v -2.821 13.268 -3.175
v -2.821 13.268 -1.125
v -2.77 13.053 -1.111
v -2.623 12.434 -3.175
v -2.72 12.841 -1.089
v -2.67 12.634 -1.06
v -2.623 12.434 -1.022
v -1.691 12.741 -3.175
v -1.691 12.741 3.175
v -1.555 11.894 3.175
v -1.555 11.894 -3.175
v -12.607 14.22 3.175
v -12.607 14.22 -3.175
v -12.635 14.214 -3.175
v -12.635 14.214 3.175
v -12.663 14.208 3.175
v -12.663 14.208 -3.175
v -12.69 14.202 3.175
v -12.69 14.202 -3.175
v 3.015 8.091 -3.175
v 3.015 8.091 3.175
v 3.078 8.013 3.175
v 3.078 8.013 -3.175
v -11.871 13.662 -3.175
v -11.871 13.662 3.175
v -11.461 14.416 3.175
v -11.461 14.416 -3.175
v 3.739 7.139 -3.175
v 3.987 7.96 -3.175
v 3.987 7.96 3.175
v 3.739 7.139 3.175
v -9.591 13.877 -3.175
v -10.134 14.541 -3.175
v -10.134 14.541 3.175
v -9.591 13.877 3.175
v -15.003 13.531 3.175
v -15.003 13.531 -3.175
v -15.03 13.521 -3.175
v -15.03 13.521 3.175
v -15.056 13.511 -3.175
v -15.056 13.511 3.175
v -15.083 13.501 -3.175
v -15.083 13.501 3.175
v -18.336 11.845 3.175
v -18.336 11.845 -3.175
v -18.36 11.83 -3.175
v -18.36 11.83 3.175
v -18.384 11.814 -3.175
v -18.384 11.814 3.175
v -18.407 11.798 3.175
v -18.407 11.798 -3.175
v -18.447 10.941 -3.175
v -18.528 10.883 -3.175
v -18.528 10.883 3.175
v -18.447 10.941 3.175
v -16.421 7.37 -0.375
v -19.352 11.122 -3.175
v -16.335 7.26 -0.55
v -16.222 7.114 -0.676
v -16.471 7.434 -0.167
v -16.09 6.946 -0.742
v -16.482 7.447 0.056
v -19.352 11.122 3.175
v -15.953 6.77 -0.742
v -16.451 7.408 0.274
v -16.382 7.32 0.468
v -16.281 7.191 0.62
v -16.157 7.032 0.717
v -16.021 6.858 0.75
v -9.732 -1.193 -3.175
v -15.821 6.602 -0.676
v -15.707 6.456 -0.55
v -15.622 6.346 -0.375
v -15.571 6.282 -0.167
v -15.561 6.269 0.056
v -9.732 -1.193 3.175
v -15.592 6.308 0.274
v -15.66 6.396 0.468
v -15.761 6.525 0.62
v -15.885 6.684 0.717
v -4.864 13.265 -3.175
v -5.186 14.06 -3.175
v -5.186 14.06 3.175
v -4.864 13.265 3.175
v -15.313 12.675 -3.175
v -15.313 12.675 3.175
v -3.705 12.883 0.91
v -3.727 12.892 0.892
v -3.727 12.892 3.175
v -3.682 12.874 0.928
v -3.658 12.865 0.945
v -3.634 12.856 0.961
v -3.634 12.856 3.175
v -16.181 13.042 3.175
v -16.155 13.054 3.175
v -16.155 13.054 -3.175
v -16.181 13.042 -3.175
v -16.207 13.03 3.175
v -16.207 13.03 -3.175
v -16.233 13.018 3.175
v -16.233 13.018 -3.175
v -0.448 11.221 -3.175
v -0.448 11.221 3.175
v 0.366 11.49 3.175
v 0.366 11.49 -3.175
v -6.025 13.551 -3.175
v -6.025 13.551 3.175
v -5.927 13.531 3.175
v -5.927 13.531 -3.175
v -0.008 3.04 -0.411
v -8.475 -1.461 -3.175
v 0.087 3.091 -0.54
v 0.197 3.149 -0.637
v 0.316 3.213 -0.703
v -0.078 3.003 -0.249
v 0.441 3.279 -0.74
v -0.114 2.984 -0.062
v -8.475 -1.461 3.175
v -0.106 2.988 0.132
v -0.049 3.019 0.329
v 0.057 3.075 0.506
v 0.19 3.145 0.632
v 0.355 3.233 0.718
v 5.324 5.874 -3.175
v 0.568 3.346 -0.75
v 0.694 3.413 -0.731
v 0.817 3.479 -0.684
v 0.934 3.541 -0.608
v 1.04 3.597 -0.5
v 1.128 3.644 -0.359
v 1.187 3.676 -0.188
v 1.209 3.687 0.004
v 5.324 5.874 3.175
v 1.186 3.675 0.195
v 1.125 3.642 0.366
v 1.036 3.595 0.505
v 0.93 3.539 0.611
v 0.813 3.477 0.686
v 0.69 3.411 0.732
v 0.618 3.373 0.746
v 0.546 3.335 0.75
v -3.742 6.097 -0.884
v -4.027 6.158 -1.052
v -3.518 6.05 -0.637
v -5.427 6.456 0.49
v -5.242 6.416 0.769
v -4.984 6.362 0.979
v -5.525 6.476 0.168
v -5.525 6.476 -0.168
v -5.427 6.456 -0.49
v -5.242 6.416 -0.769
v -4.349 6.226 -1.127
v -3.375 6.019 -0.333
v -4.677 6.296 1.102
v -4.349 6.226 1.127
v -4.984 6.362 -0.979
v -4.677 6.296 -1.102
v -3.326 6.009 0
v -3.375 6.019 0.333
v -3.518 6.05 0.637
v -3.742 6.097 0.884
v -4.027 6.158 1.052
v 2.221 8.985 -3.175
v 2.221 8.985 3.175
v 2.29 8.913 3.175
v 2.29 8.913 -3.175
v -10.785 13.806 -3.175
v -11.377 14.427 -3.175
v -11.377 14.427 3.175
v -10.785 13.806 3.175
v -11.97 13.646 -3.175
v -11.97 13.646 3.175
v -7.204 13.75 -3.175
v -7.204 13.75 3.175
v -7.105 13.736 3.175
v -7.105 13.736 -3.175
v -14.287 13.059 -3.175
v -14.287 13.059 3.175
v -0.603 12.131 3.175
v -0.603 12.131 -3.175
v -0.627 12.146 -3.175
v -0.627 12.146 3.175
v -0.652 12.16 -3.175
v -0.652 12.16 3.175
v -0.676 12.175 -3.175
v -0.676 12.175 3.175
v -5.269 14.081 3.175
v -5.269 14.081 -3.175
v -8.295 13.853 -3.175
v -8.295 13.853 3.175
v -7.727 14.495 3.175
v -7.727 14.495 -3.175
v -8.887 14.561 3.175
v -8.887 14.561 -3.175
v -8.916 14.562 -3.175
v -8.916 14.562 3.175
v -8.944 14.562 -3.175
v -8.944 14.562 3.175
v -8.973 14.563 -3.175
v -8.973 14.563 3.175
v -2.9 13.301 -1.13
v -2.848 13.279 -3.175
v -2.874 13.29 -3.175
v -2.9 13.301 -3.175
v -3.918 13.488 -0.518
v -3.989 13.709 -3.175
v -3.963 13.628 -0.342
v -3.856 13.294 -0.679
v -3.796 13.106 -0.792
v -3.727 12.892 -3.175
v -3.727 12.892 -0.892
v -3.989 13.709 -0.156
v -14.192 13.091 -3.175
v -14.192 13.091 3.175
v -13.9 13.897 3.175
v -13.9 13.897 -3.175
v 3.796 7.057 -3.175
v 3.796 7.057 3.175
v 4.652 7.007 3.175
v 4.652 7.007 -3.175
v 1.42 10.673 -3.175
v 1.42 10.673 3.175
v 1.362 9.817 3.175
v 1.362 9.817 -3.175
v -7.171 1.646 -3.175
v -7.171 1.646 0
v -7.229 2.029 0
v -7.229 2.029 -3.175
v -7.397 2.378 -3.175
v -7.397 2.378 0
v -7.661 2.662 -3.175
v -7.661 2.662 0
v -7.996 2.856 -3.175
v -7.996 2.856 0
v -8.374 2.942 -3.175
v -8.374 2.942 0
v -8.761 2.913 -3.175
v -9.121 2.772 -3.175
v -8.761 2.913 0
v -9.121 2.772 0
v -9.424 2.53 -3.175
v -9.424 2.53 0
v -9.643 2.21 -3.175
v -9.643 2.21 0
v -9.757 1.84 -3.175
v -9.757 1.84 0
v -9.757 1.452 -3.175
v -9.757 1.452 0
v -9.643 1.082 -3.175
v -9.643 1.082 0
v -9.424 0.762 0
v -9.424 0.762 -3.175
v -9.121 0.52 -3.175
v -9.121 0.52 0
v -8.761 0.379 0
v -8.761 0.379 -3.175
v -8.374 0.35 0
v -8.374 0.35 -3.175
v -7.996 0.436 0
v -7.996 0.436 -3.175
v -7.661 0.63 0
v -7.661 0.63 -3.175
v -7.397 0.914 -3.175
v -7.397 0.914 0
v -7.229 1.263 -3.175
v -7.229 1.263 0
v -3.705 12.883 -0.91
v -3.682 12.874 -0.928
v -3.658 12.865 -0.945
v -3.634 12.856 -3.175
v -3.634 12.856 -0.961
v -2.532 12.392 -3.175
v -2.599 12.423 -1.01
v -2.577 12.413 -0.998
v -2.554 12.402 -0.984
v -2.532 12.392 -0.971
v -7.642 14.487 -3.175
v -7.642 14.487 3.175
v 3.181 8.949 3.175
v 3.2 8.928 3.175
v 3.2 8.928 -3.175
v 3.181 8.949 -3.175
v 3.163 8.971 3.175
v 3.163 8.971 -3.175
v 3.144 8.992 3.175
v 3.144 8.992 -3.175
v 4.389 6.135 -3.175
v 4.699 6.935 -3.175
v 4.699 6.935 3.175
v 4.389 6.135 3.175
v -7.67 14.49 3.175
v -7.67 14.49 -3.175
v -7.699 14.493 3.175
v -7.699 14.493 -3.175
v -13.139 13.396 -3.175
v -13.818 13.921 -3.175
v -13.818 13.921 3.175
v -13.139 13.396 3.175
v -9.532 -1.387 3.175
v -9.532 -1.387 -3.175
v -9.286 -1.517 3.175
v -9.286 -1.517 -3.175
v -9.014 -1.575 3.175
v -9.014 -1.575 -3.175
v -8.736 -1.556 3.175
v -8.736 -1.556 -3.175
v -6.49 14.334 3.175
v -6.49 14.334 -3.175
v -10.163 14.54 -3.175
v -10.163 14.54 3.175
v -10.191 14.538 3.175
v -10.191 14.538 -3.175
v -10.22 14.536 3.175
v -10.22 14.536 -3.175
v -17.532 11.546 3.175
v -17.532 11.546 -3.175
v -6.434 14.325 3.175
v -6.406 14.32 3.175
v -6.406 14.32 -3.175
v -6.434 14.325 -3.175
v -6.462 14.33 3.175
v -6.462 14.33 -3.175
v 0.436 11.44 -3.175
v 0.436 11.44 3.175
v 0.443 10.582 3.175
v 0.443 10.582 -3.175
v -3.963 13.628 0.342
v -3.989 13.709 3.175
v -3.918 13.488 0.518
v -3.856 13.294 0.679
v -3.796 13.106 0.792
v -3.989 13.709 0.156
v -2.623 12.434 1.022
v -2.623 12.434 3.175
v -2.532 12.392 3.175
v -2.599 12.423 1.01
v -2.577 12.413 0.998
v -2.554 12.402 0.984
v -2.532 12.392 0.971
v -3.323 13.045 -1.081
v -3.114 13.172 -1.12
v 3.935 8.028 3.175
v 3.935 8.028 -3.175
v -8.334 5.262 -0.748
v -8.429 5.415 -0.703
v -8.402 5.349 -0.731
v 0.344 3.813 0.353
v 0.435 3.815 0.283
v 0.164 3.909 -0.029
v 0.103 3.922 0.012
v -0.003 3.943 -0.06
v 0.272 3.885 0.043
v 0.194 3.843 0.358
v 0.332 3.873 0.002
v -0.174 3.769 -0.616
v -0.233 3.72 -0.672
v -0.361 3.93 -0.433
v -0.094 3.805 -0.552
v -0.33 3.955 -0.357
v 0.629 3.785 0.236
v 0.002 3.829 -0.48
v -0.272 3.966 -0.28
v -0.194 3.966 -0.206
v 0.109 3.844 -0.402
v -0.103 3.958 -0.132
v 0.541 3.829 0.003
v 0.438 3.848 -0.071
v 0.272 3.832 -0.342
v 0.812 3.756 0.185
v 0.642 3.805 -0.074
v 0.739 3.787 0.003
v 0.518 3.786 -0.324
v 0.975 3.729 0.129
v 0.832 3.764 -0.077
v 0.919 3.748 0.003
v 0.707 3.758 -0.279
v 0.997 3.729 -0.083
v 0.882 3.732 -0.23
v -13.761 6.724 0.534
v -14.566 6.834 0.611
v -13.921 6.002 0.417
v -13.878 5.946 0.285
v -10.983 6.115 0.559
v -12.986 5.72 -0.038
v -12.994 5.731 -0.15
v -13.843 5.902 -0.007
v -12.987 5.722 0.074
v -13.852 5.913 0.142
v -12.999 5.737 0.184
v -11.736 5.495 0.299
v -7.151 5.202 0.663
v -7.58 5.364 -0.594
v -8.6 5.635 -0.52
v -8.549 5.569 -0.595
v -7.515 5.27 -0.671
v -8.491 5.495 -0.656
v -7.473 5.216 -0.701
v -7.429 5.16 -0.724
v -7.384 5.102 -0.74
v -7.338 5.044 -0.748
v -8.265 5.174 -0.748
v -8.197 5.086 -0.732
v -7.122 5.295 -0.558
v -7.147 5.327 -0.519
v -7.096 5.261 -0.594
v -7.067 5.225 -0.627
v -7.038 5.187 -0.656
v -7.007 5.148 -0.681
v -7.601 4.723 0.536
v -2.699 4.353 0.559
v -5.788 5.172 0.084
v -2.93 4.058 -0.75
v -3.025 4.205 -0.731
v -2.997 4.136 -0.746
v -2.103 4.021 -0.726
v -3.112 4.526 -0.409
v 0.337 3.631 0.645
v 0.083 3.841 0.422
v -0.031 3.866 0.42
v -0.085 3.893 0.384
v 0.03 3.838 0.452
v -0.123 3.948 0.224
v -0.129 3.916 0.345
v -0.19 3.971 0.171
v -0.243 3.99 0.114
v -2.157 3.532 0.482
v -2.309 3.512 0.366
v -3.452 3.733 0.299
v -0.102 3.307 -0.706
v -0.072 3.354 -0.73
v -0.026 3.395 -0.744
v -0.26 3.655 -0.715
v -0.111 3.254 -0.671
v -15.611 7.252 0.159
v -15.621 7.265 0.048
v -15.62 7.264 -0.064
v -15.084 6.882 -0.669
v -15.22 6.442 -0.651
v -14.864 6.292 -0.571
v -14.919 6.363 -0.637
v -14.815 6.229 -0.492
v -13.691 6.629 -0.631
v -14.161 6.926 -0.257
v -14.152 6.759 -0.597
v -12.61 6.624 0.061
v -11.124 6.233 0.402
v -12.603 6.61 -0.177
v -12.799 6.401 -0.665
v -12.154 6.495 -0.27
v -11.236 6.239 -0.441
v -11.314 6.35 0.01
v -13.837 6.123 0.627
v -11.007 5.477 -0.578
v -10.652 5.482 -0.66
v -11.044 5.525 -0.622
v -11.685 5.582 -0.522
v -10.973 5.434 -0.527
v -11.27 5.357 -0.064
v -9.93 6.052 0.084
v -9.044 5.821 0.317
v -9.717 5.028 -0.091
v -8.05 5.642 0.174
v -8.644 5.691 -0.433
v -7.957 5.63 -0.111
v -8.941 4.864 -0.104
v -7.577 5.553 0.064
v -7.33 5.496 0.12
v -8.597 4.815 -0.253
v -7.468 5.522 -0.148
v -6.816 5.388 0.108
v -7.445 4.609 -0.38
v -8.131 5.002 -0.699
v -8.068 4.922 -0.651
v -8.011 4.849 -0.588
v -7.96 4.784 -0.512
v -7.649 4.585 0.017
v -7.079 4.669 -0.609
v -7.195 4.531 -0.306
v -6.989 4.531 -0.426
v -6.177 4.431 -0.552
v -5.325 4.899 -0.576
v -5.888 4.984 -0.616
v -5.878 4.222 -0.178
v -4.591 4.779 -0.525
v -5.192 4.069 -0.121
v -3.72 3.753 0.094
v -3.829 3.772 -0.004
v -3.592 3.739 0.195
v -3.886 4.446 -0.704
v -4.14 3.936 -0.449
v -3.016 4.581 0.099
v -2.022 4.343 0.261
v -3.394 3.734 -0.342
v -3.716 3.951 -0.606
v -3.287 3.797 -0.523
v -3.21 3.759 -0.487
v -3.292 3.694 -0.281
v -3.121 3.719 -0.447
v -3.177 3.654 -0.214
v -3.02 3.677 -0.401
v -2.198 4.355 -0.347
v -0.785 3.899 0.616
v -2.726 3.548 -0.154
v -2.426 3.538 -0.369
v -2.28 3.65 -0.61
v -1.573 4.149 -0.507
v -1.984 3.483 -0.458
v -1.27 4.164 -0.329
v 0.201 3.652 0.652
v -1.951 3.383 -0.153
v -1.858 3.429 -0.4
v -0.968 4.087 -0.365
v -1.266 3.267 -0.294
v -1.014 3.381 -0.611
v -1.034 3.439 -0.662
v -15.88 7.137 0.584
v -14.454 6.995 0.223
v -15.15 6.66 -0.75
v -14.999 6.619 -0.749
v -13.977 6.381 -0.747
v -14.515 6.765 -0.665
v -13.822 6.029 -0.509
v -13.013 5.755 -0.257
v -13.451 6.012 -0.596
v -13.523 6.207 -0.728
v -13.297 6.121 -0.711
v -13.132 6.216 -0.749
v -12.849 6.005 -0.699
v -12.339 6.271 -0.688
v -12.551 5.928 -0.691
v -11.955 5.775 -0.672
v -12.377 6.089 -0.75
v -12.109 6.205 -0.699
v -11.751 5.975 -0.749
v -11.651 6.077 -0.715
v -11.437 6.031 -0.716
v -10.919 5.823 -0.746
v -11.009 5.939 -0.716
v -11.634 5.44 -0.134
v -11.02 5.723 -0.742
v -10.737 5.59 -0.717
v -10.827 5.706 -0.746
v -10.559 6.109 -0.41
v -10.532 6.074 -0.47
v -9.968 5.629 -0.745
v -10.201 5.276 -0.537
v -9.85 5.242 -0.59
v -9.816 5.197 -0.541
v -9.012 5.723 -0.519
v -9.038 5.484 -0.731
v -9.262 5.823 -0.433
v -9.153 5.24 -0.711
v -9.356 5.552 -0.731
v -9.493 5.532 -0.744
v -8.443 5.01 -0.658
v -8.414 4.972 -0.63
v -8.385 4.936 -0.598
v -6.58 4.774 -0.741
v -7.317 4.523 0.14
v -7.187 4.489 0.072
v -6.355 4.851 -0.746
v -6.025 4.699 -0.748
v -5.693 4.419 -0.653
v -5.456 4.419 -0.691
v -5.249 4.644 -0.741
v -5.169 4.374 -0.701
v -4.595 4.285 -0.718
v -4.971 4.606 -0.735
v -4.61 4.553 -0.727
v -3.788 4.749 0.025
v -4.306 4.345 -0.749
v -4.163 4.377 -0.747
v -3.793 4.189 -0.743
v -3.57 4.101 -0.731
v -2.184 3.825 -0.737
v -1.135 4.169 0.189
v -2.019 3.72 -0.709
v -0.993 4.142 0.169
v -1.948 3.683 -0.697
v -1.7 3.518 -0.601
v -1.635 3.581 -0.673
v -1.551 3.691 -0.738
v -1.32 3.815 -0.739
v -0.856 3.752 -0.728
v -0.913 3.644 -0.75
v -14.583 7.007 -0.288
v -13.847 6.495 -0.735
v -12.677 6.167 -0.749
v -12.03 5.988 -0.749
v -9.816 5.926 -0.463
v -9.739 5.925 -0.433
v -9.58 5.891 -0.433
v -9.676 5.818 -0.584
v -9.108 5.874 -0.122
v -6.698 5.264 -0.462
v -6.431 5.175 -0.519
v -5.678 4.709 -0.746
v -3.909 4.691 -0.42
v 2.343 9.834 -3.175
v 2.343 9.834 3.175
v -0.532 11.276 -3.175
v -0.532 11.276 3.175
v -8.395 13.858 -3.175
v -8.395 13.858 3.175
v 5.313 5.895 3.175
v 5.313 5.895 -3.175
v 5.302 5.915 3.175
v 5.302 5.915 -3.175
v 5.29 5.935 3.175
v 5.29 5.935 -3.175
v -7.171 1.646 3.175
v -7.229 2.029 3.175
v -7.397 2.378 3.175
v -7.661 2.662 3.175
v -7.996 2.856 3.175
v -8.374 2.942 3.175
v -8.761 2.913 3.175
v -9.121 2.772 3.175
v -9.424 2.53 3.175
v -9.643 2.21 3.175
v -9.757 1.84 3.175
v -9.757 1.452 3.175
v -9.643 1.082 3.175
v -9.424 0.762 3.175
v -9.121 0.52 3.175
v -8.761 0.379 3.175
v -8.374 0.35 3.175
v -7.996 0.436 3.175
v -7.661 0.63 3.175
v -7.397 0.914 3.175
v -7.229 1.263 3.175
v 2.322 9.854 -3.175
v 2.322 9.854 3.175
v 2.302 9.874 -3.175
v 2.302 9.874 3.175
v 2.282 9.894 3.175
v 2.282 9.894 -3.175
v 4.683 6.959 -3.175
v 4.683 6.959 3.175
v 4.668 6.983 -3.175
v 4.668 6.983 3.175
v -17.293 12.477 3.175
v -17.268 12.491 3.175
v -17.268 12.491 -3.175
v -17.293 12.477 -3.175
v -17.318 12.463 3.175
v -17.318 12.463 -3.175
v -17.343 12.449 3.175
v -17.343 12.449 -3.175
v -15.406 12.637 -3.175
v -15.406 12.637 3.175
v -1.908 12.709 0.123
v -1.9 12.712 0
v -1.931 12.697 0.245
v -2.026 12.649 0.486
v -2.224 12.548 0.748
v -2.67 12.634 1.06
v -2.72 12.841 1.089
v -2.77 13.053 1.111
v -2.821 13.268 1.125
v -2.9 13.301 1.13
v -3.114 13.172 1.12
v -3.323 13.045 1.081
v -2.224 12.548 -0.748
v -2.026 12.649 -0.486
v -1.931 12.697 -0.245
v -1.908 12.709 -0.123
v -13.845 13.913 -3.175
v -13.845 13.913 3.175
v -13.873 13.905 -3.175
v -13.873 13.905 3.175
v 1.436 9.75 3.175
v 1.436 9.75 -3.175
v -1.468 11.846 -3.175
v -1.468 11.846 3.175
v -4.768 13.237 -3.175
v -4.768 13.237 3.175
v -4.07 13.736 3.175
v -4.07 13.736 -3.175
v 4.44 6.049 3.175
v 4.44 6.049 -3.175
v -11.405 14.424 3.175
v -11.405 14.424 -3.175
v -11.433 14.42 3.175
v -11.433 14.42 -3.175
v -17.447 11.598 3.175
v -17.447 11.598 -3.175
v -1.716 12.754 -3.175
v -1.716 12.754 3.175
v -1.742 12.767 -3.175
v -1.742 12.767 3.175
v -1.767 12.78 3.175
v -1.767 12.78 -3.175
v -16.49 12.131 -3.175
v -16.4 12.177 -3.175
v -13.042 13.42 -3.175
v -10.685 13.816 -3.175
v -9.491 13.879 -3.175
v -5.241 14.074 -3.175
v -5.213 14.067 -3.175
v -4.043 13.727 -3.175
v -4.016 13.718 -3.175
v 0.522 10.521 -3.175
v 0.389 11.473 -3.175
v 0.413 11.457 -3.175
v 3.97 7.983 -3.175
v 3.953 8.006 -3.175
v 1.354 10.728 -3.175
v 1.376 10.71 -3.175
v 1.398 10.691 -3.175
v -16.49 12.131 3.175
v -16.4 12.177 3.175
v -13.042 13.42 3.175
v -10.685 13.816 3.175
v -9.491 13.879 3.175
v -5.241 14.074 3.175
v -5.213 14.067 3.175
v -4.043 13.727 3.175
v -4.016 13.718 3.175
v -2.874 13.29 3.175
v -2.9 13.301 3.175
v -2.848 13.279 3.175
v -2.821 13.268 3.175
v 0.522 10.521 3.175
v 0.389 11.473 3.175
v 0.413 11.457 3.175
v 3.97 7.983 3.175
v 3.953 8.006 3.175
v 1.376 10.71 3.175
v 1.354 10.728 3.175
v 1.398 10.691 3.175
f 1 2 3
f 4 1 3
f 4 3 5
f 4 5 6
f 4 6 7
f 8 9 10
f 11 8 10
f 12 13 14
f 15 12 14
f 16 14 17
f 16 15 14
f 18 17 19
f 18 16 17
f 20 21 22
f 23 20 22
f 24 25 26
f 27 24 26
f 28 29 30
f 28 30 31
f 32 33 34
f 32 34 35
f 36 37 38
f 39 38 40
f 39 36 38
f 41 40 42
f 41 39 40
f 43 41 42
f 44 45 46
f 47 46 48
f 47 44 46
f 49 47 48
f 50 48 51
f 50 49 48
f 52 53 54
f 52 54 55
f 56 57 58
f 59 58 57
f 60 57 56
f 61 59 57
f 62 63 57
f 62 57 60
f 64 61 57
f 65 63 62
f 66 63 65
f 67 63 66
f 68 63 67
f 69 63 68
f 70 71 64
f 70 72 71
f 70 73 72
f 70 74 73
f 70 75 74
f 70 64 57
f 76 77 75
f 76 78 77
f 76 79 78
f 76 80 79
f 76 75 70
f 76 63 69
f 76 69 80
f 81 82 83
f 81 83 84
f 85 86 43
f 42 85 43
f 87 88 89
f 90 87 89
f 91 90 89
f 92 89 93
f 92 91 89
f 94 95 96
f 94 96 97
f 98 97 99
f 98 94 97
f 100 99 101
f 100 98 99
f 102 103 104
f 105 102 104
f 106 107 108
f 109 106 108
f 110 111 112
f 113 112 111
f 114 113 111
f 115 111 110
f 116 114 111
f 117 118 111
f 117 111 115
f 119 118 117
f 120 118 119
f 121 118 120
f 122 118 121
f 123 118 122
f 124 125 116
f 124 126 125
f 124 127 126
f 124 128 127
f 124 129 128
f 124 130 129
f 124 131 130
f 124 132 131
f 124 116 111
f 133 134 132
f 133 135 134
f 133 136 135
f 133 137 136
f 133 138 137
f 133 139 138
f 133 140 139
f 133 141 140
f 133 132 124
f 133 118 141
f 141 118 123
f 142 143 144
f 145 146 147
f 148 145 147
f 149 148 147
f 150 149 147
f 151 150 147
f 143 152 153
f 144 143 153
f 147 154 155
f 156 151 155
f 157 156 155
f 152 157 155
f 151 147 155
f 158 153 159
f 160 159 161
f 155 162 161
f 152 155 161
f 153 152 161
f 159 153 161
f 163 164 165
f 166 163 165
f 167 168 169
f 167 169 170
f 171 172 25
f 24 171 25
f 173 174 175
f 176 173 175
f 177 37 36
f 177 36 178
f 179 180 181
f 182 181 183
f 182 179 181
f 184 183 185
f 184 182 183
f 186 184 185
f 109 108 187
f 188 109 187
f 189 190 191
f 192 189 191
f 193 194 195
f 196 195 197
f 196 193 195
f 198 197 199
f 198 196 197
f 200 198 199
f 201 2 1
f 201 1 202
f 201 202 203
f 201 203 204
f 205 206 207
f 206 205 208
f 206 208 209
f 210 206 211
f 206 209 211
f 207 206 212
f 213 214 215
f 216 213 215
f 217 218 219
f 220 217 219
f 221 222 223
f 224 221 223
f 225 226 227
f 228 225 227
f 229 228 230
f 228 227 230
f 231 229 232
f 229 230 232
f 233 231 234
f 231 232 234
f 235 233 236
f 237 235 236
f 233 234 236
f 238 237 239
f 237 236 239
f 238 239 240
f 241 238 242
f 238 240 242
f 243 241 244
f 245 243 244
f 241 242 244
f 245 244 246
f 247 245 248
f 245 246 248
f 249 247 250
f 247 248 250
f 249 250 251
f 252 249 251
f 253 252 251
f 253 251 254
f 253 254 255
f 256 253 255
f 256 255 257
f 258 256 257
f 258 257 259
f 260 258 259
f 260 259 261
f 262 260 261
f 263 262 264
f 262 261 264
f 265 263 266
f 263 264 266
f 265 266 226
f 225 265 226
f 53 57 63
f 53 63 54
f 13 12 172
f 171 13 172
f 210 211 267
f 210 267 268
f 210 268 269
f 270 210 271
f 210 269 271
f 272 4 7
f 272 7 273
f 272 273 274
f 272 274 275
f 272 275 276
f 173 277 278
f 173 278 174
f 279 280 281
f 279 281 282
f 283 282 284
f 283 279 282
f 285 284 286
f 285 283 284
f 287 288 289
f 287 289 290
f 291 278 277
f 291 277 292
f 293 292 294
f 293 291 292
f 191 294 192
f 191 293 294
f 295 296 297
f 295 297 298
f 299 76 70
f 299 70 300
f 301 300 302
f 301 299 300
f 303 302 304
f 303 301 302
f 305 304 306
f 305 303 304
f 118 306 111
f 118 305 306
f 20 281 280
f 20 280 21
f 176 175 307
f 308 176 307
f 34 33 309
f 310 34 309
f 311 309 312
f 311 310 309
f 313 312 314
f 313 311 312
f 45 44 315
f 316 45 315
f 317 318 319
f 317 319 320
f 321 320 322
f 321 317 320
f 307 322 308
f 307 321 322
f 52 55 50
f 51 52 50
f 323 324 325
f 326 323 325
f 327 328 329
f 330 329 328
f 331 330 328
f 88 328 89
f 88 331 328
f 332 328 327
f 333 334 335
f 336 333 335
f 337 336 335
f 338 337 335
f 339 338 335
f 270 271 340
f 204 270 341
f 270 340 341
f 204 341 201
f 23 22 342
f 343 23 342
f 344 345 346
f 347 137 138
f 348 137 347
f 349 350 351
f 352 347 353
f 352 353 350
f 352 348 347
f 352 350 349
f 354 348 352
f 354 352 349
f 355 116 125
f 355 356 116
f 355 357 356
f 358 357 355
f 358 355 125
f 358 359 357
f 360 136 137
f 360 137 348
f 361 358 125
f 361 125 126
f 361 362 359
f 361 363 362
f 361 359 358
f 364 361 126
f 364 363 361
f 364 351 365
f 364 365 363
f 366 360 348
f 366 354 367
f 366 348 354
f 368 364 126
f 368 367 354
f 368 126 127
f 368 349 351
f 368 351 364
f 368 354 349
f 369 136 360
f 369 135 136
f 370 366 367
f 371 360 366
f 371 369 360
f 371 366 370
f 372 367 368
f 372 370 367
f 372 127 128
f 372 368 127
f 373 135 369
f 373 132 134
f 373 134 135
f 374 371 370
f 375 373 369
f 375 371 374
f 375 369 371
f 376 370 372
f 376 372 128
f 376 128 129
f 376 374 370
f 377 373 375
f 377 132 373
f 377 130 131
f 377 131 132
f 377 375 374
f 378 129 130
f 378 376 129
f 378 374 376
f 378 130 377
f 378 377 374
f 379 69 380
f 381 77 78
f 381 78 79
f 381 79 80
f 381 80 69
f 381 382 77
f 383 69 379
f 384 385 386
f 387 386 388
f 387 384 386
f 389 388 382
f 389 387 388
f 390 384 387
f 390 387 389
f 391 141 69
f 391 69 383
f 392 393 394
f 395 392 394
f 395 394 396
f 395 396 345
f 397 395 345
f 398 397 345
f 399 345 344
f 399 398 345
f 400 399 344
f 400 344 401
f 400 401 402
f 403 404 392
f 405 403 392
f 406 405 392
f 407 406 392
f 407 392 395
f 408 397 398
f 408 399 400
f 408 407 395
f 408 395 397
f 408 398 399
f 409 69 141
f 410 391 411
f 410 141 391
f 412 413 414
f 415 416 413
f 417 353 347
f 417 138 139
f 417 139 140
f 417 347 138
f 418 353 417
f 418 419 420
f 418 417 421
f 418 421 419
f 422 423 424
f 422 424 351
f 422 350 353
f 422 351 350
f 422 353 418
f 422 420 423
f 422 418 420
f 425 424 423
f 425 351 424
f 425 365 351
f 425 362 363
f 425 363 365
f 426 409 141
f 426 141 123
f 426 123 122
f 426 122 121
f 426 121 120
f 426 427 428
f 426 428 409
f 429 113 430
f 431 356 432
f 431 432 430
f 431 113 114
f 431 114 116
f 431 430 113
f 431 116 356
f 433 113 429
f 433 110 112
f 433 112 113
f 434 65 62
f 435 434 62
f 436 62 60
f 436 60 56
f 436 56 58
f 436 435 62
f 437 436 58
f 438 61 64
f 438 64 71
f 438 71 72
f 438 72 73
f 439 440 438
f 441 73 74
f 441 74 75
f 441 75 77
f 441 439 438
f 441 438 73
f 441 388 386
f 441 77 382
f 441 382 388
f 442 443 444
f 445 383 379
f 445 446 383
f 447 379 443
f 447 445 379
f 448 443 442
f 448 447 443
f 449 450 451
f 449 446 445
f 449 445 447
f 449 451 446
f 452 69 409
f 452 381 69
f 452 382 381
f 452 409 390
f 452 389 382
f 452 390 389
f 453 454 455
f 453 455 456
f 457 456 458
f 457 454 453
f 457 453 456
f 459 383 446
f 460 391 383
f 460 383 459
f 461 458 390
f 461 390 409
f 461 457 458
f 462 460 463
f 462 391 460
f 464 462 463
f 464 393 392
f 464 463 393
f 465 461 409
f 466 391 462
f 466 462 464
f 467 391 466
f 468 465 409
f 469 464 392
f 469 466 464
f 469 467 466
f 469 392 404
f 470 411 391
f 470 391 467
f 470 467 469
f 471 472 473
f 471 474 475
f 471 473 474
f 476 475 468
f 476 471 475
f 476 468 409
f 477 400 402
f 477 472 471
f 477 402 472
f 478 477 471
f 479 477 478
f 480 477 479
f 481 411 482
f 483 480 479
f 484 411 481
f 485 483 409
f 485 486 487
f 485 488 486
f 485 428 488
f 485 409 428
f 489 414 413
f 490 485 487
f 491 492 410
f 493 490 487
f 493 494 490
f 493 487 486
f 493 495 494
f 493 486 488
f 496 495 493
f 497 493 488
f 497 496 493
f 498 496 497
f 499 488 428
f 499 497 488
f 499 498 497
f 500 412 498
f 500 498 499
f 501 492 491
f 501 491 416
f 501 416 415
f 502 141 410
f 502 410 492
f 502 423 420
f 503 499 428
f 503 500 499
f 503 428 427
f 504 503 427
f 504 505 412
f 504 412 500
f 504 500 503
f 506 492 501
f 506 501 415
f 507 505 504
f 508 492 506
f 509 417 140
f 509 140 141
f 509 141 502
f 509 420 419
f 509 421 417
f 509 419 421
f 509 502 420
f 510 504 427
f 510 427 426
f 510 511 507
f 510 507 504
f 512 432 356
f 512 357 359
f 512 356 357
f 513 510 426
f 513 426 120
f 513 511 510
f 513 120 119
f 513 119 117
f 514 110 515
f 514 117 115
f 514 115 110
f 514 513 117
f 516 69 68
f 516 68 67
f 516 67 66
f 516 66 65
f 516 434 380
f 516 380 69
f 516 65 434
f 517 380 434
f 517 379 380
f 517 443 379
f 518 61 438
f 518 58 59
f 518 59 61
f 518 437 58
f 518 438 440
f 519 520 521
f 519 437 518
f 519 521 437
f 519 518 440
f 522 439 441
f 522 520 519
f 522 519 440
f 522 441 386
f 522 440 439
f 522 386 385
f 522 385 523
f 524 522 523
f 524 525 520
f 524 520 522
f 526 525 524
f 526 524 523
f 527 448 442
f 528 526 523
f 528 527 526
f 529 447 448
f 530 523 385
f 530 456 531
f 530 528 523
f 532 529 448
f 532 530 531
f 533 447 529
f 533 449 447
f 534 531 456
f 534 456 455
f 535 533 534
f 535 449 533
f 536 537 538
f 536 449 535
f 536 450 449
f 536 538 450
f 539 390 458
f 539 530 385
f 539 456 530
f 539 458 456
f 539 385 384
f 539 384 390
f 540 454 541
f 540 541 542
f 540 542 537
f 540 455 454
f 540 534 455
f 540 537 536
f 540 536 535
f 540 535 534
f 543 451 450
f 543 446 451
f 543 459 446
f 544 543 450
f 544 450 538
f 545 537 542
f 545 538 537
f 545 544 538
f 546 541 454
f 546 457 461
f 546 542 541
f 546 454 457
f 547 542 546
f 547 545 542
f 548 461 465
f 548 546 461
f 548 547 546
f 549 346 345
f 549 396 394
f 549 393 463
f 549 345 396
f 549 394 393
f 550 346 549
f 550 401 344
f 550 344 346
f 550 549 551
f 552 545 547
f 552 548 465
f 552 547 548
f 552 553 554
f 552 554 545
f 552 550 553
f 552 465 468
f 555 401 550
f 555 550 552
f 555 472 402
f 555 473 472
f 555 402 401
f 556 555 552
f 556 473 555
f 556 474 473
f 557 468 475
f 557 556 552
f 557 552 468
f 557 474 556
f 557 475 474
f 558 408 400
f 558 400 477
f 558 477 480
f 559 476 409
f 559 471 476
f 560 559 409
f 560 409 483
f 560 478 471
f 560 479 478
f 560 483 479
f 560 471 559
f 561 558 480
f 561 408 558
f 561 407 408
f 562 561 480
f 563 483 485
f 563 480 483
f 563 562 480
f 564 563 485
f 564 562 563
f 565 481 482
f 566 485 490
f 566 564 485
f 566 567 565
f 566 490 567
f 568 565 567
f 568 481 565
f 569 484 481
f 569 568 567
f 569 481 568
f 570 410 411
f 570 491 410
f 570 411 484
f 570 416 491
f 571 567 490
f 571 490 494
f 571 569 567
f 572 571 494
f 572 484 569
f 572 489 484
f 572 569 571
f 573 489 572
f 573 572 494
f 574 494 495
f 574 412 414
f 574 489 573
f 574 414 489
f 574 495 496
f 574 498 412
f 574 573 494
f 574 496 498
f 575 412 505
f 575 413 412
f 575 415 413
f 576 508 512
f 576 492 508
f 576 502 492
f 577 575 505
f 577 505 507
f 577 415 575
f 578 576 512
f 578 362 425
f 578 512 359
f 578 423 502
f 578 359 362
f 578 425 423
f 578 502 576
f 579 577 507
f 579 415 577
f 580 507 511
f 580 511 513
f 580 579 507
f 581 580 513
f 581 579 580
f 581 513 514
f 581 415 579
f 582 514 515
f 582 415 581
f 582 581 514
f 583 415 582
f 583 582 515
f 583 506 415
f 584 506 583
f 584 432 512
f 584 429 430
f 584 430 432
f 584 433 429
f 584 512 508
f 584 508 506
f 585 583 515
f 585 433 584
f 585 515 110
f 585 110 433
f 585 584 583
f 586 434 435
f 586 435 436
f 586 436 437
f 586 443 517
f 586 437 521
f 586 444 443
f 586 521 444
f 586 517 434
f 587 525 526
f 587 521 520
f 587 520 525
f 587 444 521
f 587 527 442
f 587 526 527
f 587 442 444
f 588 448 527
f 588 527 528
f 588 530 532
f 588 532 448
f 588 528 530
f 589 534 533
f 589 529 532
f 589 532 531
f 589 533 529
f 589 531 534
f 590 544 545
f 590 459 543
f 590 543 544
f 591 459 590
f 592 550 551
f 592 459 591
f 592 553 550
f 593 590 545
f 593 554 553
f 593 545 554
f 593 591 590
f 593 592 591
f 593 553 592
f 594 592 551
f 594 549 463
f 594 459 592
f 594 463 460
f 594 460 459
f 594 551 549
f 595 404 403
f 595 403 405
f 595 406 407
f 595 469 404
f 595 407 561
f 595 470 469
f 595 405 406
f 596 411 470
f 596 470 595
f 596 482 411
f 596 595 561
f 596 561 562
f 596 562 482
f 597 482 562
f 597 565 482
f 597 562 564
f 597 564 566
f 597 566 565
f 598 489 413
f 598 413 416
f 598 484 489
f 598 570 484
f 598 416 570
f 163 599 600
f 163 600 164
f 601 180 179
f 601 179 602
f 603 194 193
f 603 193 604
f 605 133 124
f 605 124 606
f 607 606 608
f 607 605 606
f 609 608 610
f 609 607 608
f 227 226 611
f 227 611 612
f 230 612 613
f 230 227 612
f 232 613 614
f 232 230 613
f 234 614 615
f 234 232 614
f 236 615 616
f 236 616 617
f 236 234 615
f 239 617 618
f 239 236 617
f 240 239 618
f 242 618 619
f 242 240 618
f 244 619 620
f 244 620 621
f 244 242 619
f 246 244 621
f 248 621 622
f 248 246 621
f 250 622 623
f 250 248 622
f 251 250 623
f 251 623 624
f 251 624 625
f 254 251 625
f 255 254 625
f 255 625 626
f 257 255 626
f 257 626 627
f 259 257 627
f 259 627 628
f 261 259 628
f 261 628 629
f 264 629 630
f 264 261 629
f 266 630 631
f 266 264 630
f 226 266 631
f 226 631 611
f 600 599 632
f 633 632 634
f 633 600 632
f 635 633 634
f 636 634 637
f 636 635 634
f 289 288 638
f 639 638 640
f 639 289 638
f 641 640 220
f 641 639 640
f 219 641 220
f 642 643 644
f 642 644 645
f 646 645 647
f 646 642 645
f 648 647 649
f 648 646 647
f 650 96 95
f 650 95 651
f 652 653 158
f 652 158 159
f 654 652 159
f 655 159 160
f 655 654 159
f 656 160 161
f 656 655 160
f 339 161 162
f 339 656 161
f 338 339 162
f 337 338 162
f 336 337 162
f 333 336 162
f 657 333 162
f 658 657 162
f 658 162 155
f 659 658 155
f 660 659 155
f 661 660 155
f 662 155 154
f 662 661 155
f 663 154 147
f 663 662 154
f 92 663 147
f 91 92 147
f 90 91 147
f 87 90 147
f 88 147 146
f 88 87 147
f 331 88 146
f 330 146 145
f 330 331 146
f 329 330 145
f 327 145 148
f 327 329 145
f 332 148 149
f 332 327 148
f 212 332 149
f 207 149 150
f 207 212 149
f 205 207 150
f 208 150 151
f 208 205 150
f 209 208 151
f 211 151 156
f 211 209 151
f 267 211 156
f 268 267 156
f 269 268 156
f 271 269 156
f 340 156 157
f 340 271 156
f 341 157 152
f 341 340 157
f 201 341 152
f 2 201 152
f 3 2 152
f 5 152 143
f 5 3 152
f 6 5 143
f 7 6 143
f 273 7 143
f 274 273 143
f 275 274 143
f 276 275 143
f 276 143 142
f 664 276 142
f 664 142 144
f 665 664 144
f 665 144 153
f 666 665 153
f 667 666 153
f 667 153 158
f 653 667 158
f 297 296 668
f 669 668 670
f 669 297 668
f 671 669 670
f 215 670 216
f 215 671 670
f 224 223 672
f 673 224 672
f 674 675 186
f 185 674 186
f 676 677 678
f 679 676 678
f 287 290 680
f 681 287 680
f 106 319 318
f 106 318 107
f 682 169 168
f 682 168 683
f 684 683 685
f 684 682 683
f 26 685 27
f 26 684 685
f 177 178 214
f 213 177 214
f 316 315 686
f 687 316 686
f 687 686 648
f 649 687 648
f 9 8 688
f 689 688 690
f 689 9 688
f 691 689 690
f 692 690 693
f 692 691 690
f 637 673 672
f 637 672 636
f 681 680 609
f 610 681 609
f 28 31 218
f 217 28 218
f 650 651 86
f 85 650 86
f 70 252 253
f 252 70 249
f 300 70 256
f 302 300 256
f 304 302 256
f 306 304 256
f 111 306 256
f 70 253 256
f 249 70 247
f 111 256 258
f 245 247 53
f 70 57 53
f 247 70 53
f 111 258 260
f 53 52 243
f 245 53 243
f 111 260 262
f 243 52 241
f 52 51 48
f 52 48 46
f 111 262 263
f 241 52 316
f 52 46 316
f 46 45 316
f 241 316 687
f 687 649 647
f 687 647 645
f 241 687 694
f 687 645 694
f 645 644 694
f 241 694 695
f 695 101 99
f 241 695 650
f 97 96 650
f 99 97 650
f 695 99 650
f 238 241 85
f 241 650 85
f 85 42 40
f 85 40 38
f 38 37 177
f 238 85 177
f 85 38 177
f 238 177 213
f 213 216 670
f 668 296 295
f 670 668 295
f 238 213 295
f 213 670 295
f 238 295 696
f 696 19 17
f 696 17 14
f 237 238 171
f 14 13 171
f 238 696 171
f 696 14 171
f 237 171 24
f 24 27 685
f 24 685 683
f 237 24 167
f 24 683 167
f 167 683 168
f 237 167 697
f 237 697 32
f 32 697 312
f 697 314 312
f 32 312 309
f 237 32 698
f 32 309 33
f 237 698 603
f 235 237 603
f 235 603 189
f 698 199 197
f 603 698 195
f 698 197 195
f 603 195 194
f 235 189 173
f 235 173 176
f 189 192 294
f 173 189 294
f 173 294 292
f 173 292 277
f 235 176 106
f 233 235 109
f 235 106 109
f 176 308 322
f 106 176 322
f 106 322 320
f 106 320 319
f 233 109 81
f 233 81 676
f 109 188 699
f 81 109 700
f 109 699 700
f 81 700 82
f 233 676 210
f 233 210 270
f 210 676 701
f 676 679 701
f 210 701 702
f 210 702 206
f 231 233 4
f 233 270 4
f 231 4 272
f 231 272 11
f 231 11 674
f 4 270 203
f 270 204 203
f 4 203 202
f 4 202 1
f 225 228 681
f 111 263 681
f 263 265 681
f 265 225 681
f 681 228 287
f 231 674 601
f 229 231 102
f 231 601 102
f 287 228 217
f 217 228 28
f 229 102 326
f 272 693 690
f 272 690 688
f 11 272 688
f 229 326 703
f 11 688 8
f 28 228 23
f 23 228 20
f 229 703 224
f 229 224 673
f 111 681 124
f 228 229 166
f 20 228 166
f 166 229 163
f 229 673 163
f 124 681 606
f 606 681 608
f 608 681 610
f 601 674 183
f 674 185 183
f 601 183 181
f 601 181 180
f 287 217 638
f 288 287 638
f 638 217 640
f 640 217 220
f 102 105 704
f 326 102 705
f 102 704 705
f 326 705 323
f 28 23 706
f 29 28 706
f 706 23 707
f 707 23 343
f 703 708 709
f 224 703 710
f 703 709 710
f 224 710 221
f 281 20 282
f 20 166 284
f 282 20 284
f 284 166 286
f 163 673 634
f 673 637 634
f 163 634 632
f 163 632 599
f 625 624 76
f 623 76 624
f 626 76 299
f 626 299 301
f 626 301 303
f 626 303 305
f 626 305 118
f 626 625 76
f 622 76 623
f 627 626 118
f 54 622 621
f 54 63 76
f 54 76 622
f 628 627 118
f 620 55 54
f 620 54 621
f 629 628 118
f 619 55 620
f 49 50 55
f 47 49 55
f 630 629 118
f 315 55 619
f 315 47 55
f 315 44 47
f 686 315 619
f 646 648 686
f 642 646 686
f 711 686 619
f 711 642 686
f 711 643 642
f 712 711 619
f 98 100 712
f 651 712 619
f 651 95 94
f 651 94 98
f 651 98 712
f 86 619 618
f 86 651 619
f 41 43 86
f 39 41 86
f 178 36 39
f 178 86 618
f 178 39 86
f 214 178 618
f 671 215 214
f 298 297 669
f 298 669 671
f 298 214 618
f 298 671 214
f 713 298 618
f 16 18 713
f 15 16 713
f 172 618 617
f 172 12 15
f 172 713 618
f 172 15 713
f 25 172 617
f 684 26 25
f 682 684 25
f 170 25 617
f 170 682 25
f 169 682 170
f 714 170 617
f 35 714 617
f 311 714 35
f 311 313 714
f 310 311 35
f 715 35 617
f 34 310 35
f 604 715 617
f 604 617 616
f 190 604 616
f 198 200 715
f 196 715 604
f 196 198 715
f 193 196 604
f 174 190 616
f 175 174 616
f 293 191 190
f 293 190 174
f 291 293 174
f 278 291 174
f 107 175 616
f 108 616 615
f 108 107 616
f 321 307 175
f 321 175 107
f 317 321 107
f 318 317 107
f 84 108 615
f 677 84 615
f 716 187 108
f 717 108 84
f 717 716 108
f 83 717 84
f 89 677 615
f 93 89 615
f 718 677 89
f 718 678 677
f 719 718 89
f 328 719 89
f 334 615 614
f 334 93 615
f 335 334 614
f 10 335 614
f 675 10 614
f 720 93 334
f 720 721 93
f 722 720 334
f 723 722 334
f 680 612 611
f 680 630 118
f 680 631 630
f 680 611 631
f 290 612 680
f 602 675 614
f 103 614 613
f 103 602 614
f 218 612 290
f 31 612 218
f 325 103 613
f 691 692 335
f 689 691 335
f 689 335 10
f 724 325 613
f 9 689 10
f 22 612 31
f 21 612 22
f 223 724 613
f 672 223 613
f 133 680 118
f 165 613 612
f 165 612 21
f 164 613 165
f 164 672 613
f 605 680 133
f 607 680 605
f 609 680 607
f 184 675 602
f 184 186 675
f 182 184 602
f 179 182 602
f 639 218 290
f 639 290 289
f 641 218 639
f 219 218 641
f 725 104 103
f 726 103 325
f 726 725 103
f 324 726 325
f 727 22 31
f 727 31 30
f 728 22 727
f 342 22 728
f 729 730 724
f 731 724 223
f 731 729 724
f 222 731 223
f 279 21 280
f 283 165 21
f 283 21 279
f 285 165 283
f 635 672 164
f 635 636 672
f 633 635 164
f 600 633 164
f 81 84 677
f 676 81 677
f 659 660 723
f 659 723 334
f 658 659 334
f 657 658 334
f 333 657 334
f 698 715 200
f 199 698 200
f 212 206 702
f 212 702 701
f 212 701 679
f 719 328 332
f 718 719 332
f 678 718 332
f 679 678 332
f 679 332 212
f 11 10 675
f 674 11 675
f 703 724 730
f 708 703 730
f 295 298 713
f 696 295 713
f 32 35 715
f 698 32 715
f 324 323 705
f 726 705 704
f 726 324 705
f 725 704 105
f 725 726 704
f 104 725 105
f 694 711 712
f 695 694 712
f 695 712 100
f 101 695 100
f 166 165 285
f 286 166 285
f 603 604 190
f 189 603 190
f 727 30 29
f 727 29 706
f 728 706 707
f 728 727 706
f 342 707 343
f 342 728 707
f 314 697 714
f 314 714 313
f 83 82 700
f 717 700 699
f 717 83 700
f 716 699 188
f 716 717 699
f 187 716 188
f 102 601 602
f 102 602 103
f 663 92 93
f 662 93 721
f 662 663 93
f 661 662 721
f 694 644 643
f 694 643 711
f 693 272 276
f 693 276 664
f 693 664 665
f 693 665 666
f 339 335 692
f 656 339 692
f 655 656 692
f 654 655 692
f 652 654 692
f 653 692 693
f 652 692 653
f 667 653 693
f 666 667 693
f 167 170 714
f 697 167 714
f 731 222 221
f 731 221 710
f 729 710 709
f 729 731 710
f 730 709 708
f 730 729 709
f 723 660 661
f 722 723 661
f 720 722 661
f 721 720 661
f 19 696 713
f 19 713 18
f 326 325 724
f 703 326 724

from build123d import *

# Parameters (mm, degrees)
BOSS_EXTRUDE1_DEPTH      = 3.175
BOSS_EXTRUDE1_DEPTH_BACK = 3.175
SKETCH1_R                = 1.3
SKETCH4_R                = 0.75
CUT_EXTRUDE2_DEPTH       = 7.5
CUT_EXTRUDE2_DEPTH_BACK  = 10
SKETCH3_R                = 1.1303
CUT_EXTRUDE3_DEPTH       = 10
CUT_EXTRUDE3_DEPTH_BACK  = 10


with BuildPart() as part:
    # Sketch1 → Boss-Extrude1 (new, two sides: drawn at the far end of the back side and taken through both)
    with BuildSketch(Plane.XY.offset(-BOSS_EXTRUDE1_DEPTH_BACK)):
        with BuildLine():
            Line((-19.351944596, 11.121666082), (-9.732209918, -1.193299023))
            ThreePointArc((-9.732209918, -1.193299023), (-9.152143222, -1.55583694), (-8.474751471, -1.460697412))
            Line((-8.474751471, -1.460697412), (5.323571039, 5.874420633))
            ThreePointArc((5.323571039, 5.874420633), (-5.801036197, 14.202963476), (-19.351944596, 11.121666082))
        make_face()
        with Locations((-8.471265065, 1.646037216)):
            Circle(SKETCH1_R, mode=Mode.SUBTRACT)
    extrude(amount=BOSS_EXTRUDE1_DEPTH + BOSS_EXTRUDE1_DEPTH_BACK)

    # Cut-Sweep1: sweep along a path in Sketch2
    with BuildLine(Plane.XY) as cut_sweep1_path:
        Line((-16.021378593, 6.857951387), (3.426511905, 2.722359798))
    # Sketch4 → Cut-Sweep1 (sweep, cut)
    with BuildSketch(Plane(origin=(-6.623066075, -5.173554115, 0), x_dir=(0, 0, 1), z_dir=(-0.7880657186592105, -0.6155911167927476, 0))):
        with Locations((0, 15.267134729)):
            Circle(SKETCH4_R)
    sweep(path=cut_sweep1_path.line, mode=Mode.SUBTRACT)

    # Sketch3 → Cut-Extrude2 (cut, two sides: drawn at the far end of the back side and taken through both)
    with BuildSketch(Plane(origin=(2.63861758, 12.40827211, 0), x_dir=(0.9781290338253494, -0.2079990220839719, 0), z_dir=(-0.2079990220839719, -0.9781290338253494, 0)).offset(-CUT_EXTRUDE2_DEPTH_BACK)):
        with Locations((-5.633213298, 0)):
            Circle(SKETCH3_R)
    extrude(amount=CUT_EXTRUDE2_DEPTH + CUT_EXTRUDE2_DEPTH_BACK, mode=Mode.SUBTRACT)

    # Sketch5 → Cut-Extrude3 (cut, two sides: drawn at the far end of the back side and taken through both)
    with BuildSketch(Plane.XY.offset(-CUT_EXTRUDE3_DEPTH_BACK)):
        with BuildLine():
            Line((-18.335959881, 11.845477975), (-17.532299102, 11.545639171))
            Line((-17.532299102, 11.545639171), (-17.446850408, 11.59758646))
            Line((-17.446850408, 11.59758646), (-17.343115269, 12.449063399))
            ThreePointArc((-17.343115269, 12.449063399), (-17.844834345, 12.155983405), (-18.335959881, 11.845477975))
        make_face()
        with BuildLine():
            Line((-19.351944596, 11.121666082), (-18.527988766, 10.883190202))
            Line((-18.527988766, 10.883190202), (-18.446694016, 10.941423901))
            Line((-18.446694016, 10.941423901), (-18.407365445, 11.798294498))
            ThreePointArc((-18.407365445, 11.798294498), (-18.88559278, 11.468269454), (-19.351944596, 11.121666082))
        make_face()
        with BuildLine():
            Line((-17.268359717, 12.490736443), (-16.489556709, 12.131237025))
            Line((-16.489556709, 12.131237025), (-16.400439201, 12.176602977))
            Line((-16.400439201, 12.176602977), (-16.23288644, 13.017852066))
            ThreePointArc((-16.23288644, 13.017852066), (-16.755248788, 12.763381061), (-17.268359717, 12.490736443))
        make_face()
        with BuildLine():
            Line((-16.15520532, 13.053778081), (-15.405681675, 12.636659079))
            Line((-15.405681675, 12.636659079), (-15.313401308, 12.675186133))
            Line((-15.313401308, 12.675186133), (-15.082982195, 13.501431247))
            ThreePointArc((-15.082982195, 13.501431247), (-15.623022142, 13.287013969), (-16.15520532, 13.053778081))
        make_face()
        with BuildLine():
            Line((-15.002816533, 13.531406266), (-14.286827611, 13.059035839))
            Line((-14.286827611, 13.059035839), (-14.191908301, 13.090505261))
            Line((-14.191908301, 13.090505261), (-13.89993102, 13.89705546))
            ThreePointArc((-13.89993102, 13.89705546), (-14.454582535, 13.723909246), (-15.002816533, 13.531406266))
        make_face()
        with BuildLine():
            Line((-13.817735952, 13.920909302), (-13.139346723, 13.395969296))
            Line((-13.139346723, 13.395969296), (-13.042327365, 13.42020242))
            Line((-13.042327365, 13.42020242), (-12.690449596, 14.202478581))
            ThreePointArc((-12.690449596, 14.202478581), (-13.256563688, 14.071586455), (-13.817735952, 13.920909302))
        make_face()
        with BuildLine():
            Line((-12.606691776, 14.220075817), (-11.96975374, 13.645546536))
            Line((-11.96975374, 13.645546536), (-11.871185156, 13.662405782))
            Line((-11.871185156, 13.662405782), (-11.461404655, 14.415966594))
            ThreePointArc((-11.461404655, 14.415966594), (-12.035767257, 14.328071685), (-12.606691776, 14.220075817))
        make_face()
        with BuildLine():
            Line((-11.376559612, 14.427207318), (-10.784688934, 13.806350606))
            Line((-10.784688934, 13.806350606), (-10.685130738, 13.815740255))
            Line((-10.685130738, 13.815740255), (-10.219774001, 14.536307437))
            ThreePointArc((-10.219774001, 14.536307437), (-10.799124216, 14.491908762), (-11.376559612, 14.427207318))
        make_face()
        with BuildLine():
            Line((-10.134323437, 14.541127831), (-9.590880415, 13.877468553))
            Line((-9.590880415, 13.877468553), (-9.49089784, 13.879335297))
            Line((-9.49089784, 13.879335297), (-8.972606893, 14.562817887))
            ThreePointArc((-8.972606893, 14.562817887), (-9.553655506, 14.562167515), (-10.134323437, 14.541127831))
        make_face()
        with BuildLine():
            Line((-8.887035946, 14.561190583), (-8.395105934, 13.85849661))
            Line((-8.395105934, 13.85849661), (-8.295266624, 13.852829851))
            Line((-8.295266624, 13.852829851), (-7.726984022, 14.49534743))
            ThreePointArc((-7.726984022, 14.49534743), (-8.306432177, 14.538449054), (-8.887035946, 14.561190583))
        make_face()
        with BuildLine():
            Line((-7.641778514, 14.487281668), (-7.204154406, 13.749542489))
            Line((-7.204154406, 13.749542489), (-7.10502519, 13.736374399))
            Line((-7.10502519, 13.736374399), (-6.489977312, 14.334279127))
            ThreePointArc((-6.489977312, 14.334279127), (-7.064535238, 14.420888041), (-7.641778514, 14.487281668))
        make_face()
        with BuildLine():
            Line((-6.405620991, 14.319820698), (-6.024787362, 13.551224769))
            Line((-6.024787362, 13.551224769), (-5.926931038, 13.530630109))
            Line((-5.926931038, 13.530630109), (-5.268609769, 14.080527429))
            ThreePointArc((-5.268609769, 14.080527429), (-5.835015459, 14.210151917), (-6.405620991, 14.319820698))
        make_face()
        with BuildLine():
            Line((-5.185581561, 14.05975842), (-4.863700563, 13.264669382))
            Line((-4.863700563, 13.264669382), (-4.767672704, 13.236765076))
            Line((-4.767672704, 13.236765076), (-4.06981561, 13.73553299))
            ThreePointArc((-4.06981561, 13.73553299), (-4.624853342, 13.907437121), (-5.185581561, 14.05975842))
        make_face()
        with BuildLine():
            Line((-3.9885869, 13.708571317), (-3.727485988, 12.891503223))
            Line((-3.727485988, 12.891503223), (-3.633831783, 12.856447697))
            Line((-3.633831783, 12.856447697), (-2.900400891, 13.30125449))
            ThreePointArc((-2.900400891, 13.30125449), (-3.440919483, 13.514462291), (-3.9885869, 13.708571317))
        make_face()
        with BuildLine():
            Line((-2.82143285, 13.268253224), (-2.622594402, 12.433844914))
            Line((-2.622594402, 12.433844914), (-2.531845566, 12.391837192))
            Line((-2.531845566, 12.391837192), (-1.767004872, 12.78015751))
            ThreePointArc((-1.767004872, 12.78015751), (-2.289935572, 13.033458511), (-2.82143285, 13.268253224))
        make_face()
        with BuildLine():
            Line((-1.690745835, 12.741304013), (-1.55529874, 11.894292773))
            Line((-1.55529874, 11.894292773), (-1.467970492, 11.84557135))
            Line((-1.467970492, 11.84557135), (-0.676062318, 12.175200535))
            ThreePointArc((-0.676062318, 12.175200535), (-1.178436229, 12.46715664), (-1.690745835, 12.741304013))
        make_face()
        with BuildLine():
            Line((-0.602945237, 12.130715396), (-0.531658487, 11.275910064))
            Line((-0.531658487, 11.275910064), (-0.448246626, 11.220751552))
            Line((-0.448246626, 11.220751552), (0.366233034, 11.489818161))
            ThreePointArc((0.366233034, 11.489818161), (-0.112731901, 11.818771812), (-0.602945237, 12.130715396))
        make_face()
        with BuildLine():
            Line((0.43579304, 11.439953939), (0.442514722, 10.582207604))
            Line((0.442514722, 10.582207604), (0.521536632, 10.520925162))
            Line((0.521536632, 10.520925162), (1.353963634, 10.72790159))
            ThreePointArc((1.353963634, 10.72790159), (0.90112696, 11.091985181), (0.43579304, 11.439953939))
        make_face()
        with BuildLine():
            Line((1.419571645, 10.672941387), (1.361690097, 9.817123835))
            Line((1.361690097, 9.817123835), (1.435873415, 9.750065388))
            Line((1.435873415, 9.750065388), (2.281521722, 9.893776544))
            ThreePointArc((2.281521722, 9.893776544), (1.857384253, 10.290923018), (1.419571645, 10.672941387))
        make_face()
        with BuildLine():
            Line((2.342805254, 9.834032391), (2.220649092, 8.985002457))
            Line((2.220649092, 8.985002457), (2.289572649, 8.912548725))
            Line((2.289572649, 8.912548725), (3.143641161, 8.9921787))
            ThreePointArc((3.143641161, 8.9921787), (2.750610903, 9.42013329), (2.342805254, 9.834032391))
        make_face()
        with BuildLine():
            Line((3.200252281, 8.92798979), (3.014515038, 8.090567774))
            Line((3.014515038, 8.090567774), (3.077787526, 8.013130106))
            Line((3.077787526, 8.013130106), (3.935427337, 8.028226808))
            ThreePointArc((3.935427337, 8.028226808), (3.575735688, 8.484559836), (3.200252281, 8.92798979))
        make_face()
        with BuildLine():
            Line((3.98704464, 7.959957568), (3.738780825, 7.138897866))
            Line((3.738780825, 7.138897866), (3.796043018, 7.056915909))
            Line((3.796043018, 7.056915909), (4.652384947, 7.007393627))
            ThreePointArc((4.652384947, 7.007393627), (4.328074028, 7.489514298), (3.98704464, 7.959957568))
        make_face()
        with BuildLine():
            Line((4.69871538, 6.93543165), (4.38933449, 6.135395762))
            Line((4.38933449, 6.135395762), (4.440261288, 6.049334963))
            Line((4.440261288, 6.049334963), (5.290443523, 5.935474855))
            ThreePointArc((5.290443523, 5.935474855), (5.003354583, 6.440645969), (4.69871538, 6.93543165))
        make_face()
    extrude(amount=CUT_EXTRUDE3_DEPTH + CUT_EXTRUDE3_DEPTH_BACK, mode=Mode.SUBTRACT)


solid = part.part
